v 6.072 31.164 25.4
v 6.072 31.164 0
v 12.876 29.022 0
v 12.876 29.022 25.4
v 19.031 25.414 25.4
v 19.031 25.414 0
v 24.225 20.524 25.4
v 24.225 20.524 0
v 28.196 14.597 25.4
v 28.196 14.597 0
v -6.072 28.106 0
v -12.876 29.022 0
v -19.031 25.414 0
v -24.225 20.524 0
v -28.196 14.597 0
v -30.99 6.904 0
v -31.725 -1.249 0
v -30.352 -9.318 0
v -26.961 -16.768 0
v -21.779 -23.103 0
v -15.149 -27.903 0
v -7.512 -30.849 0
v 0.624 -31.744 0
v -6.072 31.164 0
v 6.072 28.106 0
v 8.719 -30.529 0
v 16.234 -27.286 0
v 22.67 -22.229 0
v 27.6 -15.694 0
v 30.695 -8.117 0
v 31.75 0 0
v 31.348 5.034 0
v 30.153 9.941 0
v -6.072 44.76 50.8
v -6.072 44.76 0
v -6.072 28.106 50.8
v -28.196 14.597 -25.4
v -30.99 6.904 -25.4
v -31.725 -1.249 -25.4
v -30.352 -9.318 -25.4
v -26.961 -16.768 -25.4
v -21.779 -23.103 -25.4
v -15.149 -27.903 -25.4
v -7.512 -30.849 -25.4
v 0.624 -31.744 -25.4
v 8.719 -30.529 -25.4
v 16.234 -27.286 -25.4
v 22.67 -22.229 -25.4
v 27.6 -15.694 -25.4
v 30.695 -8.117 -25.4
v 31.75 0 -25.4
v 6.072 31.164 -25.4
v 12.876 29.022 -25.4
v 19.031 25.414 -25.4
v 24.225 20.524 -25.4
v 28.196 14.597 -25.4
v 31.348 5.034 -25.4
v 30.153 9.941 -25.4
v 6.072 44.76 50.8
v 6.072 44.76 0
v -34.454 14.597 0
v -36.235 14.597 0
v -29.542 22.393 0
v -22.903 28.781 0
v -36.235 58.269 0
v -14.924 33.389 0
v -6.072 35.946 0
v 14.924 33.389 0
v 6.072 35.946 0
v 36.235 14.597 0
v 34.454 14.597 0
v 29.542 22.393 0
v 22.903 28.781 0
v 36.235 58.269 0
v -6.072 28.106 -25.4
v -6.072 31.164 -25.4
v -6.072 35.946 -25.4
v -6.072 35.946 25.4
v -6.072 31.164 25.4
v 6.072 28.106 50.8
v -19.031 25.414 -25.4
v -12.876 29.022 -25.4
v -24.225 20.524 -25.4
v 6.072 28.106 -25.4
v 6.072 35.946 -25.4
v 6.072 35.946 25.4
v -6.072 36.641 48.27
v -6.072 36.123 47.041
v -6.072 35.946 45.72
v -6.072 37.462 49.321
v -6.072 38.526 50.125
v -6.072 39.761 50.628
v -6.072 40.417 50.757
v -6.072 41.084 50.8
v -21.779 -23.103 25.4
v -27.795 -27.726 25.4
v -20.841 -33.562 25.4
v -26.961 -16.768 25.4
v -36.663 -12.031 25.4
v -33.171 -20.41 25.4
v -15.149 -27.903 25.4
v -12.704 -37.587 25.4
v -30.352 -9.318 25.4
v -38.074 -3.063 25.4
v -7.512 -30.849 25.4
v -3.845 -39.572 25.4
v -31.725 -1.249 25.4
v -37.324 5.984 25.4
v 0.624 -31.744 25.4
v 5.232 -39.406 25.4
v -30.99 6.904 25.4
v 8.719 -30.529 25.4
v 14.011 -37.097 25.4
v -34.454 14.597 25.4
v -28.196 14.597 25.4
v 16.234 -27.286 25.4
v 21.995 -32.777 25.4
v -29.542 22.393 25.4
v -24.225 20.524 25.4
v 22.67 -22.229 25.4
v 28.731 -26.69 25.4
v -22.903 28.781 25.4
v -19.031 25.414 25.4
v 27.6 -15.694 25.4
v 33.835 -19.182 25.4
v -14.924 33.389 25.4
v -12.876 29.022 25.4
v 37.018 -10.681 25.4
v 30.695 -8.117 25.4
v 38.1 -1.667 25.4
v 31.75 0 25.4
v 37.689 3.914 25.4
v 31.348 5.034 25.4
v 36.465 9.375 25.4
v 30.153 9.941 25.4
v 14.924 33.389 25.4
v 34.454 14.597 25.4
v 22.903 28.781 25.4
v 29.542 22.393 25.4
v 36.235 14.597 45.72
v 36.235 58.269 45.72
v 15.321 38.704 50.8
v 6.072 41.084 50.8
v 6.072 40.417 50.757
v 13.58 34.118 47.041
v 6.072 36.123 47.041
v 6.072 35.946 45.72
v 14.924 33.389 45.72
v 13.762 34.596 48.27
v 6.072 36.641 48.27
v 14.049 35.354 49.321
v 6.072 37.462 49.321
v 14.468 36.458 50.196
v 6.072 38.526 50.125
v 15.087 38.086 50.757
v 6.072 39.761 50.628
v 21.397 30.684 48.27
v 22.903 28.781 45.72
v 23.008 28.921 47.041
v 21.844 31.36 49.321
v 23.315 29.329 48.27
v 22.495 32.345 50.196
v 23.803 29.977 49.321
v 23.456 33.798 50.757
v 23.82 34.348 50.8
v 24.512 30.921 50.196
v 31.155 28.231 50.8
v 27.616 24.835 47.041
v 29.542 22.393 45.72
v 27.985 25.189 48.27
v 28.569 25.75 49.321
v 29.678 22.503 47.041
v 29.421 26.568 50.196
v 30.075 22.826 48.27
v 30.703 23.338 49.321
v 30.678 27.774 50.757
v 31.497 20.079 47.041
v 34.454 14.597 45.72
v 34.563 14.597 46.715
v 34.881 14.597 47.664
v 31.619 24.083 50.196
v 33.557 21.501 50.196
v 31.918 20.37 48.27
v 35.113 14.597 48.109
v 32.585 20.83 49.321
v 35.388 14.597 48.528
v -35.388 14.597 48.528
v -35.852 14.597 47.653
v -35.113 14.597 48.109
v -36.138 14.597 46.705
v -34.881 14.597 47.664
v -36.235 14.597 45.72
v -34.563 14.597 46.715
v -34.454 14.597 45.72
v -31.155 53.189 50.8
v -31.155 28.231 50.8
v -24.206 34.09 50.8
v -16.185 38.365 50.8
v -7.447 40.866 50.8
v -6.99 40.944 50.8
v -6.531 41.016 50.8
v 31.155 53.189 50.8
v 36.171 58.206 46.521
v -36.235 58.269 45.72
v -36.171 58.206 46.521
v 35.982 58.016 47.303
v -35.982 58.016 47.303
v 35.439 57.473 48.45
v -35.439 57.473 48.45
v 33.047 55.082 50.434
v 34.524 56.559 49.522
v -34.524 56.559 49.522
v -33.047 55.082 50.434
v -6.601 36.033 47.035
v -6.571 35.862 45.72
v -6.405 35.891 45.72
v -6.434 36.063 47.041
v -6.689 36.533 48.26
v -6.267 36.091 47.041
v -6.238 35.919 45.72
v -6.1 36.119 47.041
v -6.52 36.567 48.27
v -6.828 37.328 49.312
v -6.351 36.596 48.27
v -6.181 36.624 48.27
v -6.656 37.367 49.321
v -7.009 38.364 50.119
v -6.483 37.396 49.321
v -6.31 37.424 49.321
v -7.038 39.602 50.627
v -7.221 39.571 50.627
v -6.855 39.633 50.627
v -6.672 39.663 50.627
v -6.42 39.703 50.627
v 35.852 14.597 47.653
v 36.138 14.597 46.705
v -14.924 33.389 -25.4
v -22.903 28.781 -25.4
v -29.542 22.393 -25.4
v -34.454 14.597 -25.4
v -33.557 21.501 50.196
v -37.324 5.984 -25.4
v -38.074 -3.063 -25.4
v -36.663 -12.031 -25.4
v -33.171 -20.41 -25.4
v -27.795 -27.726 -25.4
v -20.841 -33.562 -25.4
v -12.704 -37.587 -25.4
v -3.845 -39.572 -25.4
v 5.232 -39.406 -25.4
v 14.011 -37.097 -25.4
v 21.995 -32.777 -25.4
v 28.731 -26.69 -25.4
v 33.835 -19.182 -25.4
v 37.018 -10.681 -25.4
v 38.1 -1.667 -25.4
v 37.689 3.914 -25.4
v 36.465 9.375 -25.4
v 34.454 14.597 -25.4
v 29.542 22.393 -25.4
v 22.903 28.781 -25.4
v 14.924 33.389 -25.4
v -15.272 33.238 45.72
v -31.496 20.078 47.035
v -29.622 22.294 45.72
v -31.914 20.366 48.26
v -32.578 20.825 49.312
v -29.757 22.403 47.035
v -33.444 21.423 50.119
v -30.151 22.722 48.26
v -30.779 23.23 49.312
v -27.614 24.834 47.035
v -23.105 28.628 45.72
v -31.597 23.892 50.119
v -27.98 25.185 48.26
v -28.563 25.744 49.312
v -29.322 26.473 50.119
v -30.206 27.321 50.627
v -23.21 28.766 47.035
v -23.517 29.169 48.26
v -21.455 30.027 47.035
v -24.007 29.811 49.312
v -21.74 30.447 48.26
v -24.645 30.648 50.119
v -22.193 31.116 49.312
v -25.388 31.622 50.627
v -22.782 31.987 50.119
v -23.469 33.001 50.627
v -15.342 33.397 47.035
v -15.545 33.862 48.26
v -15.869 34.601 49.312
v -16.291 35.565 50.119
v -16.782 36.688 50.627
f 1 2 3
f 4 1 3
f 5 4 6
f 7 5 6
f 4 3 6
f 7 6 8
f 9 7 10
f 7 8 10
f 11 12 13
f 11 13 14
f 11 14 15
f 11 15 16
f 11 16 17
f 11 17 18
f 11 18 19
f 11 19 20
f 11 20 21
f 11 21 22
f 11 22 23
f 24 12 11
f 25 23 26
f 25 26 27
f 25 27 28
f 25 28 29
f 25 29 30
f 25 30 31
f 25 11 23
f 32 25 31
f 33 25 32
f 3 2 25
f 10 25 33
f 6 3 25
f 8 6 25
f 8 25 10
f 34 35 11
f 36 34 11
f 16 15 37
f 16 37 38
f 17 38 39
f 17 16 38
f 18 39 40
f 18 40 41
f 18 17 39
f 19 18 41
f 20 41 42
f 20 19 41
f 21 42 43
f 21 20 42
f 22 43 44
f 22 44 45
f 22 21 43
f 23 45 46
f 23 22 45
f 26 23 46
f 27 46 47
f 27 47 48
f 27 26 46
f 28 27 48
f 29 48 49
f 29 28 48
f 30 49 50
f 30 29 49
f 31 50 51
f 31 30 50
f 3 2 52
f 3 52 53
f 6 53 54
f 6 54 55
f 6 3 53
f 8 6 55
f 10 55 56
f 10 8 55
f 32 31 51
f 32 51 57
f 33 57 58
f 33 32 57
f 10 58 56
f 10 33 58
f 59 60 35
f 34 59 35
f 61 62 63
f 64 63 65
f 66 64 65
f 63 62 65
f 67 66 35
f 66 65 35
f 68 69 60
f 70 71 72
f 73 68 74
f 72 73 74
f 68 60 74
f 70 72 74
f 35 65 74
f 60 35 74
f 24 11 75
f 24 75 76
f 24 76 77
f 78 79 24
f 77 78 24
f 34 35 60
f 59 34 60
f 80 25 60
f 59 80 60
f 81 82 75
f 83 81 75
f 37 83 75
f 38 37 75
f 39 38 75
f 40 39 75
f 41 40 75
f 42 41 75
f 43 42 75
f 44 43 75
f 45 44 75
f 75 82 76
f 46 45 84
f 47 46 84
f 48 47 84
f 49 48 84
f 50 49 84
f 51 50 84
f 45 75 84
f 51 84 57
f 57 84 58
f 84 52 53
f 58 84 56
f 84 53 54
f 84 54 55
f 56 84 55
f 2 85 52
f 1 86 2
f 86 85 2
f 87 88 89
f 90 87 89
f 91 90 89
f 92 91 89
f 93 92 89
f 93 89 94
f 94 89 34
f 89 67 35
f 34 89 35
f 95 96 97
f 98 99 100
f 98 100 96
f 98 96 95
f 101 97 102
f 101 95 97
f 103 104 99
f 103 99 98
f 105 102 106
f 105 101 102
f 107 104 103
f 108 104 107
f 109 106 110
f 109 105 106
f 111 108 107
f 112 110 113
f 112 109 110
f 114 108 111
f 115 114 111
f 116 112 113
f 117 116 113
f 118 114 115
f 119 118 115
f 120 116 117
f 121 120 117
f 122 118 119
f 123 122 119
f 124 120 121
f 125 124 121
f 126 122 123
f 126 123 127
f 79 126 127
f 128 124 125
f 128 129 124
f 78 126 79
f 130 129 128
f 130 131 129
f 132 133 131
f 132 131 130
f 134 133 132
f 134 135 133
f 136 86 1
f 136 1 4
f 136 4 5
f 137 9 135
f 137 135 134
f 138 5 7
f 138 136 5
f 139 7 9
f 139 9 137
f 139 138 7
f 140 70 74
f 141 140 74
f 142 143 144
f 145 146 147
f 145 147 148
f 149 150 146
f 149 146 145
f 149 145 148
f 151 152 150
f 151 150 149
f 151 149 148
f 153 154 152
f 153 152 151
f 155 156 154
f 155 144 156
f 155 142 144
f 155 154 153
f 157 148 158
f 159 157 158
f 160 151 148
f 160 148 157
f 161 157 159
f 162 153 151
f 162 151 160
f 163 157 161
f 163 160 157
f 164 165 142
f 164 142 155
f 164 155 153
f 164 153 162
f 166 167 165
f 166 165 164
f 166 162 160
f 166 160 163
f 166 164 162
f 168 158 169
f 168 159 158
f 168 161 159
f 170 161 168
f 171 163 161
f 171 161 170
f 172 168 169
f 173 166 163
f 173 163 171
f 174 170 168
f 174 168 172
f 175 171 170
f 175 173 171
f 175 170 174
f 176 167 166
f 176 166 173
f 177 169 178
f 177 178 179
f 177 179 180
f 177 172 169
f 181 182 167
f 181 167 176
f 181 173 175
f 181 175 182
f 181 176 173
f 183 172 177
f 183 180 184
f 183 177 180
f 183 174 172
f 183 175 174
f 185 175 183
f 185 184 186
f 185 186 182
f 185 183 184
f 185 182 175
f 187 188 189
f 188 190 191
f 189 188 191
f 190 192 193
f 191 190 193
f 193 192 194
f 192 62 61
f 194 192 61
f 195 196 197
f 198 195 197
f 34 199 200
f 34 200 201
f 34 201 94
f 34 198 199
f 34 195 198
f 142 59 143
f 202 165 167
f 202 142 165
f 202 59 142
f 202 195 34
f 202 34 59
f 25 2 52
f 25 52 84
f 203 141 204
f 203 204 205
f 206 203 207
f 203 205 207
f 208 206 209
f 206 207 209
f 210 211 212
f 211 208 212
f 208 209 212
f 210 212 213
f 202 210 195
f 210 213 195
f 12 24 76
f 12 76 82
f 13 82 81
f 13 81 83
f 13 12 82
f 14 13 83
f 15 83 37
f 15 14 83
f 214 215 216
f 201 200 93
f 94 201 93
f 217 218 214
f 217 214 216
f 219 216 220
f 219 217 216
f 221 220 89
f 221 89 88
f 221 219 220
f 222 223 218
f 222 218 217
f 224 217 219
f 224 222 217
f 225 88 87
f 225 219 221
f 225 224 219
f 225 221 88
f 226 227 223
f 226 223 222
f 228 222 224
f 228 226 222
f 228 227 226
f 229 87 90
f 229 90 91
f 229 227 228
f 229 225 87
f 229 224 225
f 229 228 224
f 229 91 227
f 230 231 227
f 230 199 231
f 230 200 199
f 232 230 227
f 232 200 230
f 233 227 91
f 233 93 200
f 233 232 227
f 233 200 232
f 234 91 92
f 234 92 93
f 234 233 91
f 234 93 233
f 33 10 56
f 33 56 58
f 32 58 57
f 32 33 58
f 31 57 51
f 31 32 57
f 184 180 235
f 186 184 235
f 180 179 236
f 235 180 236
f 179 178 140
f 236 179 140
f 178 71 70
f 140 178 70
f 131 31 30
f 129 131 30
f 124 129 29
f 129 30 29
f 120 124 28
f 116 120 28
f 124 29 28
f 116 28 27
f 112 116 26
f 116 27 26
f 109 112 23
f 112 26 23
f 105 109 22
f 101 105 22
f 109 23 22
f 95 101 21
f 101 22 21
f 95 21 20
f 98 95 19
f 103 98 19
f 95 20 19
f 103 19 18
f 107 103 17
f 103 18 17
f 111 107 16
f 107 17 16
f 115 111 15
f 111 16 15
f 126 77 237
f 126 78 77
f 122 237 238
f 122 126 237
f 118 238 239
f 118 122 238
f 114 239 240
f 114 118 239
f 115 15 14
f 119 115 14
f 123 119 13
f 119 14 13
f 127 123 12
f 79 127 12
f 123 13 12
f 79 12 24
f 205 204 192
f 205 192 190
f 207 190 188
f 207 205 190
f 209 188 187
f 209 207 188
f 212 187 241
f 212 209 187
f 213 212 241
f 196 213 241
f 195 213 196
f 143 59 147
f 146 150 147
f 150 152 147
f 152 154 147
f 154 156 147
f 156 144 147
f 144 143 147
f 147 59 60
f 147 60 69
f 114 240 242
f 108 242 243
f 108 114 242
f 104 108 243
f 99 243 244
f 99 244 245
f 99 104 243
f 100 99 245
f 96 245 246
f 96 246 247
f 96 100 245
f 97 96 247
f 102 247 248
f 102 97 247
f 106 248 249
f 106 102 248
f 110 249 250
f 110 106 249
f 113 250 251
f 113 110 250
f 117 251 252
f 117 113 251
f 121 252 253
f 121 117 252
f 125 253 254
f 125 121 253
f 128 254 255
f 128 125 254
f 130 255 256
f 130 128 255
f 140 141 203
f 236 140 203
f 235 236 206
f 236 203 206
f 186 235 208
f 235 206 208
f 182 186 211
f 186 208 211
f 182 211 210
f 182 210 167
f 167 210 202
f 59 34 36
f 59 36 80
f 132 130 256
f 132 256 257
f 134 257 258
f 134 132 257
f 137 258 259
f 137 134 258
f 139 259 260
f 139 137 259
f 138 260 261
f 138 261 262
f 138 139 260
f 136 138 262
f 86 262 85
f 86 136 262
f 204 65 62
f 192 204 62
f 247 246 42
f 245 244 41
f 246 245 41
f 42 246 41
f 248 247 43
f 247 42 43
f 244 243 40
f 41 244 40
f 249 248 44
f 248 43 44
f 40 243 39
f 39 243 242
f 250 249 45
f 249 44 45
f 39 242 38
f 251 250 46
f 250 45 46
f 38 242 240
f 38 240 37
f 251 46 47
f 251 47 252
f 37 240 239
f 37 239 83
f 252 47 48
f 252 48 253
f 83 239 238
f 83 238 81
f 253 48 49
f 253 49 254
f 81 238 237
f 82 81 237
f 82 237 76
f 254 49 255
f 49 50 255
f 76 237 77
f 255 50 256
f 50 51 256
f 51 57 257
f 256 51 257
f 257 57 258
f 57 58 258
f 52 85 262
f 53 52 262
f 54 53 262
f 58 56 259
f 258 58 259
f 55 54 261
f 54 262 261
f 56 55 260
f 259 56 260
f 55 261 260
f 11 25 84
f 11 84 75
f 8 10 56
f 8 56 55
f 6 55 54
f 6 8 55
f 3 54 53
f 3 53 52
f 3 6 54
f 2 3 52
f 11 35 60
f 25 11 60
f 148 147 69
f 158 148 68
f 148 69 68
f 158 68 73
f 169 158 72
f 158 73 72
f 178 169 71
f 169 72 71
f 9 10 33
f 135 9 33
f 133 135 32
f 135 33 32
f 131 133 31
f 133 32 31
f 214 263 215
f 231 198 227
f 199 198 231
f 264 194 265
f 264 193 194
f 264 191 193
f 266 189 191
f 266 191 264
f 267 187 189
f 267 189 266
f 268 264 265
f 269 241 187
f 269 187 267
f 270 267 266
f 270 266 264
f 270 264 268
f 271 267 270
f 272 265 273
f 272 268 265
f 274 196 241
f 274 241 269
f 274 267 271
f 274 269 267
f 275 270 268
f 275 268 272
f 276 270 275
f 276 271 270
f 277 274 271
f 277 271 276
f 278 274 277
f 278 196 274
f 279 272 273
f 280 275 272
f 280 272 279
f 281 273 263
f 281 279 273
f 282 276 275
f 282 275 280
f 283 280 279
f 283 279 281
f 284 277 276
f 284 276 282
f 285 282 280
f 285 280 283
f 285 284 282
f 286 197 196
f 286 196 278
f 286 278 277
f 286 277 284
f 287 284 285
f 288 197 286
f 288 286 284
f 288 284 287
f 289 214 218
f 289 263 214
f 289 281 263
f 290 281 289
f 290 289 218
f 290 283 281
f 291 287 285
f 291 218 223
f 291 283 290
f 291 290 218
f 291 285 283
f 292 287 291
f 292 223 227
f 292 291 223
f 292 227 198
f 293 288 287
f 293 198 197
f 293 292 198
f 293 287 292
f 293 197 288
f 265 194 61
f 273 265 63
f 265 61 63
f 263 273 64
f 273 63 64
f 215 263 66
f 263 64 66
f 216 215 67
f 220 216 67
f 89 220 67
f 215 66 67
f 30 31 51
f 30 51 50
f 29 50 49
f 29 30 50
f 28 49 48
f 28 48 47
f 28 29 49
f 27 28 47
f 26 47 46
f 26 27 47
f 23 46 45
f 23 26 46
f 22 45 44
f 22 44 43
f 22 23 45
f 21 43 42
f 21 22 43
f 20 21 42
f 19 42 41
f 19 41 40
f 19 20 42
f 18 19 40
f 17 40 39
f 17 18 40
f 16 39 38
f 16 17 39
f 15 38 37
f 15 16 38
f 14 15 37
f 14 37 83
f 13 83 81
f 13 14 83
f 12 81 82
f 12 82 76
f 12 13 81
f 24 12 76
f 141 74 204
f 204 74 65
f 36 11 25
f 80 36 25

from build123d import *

# Parameters (mm, degrees)
F1_DEPTH    = 50.8
F2_DEPTH    = 25.4
F3_DEPTH    = 25.4
F4_T1_DEPTH = 97.86927917
F4_T3_DEPTH = 69.072270802
F4_T6_ANGLE = 93.763795783
F4_T8_ANGLE = 93.763795783
F5_DEPTH    = 50.8


# Not quite as in the source:
# - a fillet or chamfer that OpenCascade refuses, or shapes differently, is made with other operations: its cross-section is extruded or revolved along the edge and cut away or added


with BuildPart() as f1:
    # F0 (on Top) → F1 (new body)
    with BuildSketch(Plane.XY):
        with BuildLine():
            ThreePointArc((6.0717510059, 35.9461629091), (22.9027694367, 28.7809581965), (34.4542698124, 14.5969468084))
            Line((34.4542698124, 14.5969468084), (36.234639585, 14.5969468084))
            Line((36.234639585, 14.5969468084), (36.234639585, 58.2692176104))
            Line((36.234639585, 58.2692176104), (-36.234639585, 58.2692176104))
            Line((-36.234639585, 58.2692176104), (-36.234639585, 14.5969468084))
            Line((-36.234639585, 14.5969468084), (-34.4542698124, 14.5969468084))
            ThreePointArc((-34.4542698124, 14.5969468084), (-22.9027694367, 28.7809581965), (-6.0717510059, 35.9461629091))
            Line((-6.0717510059, 35.9461629091), (-6.0717510059, 44.7598363188))
            Line((-6.0717510059, 44.7598363188), (6.0717510059, 44.7598363188))
            Line((6.0717510059, 44.7598363188), (6.0717510059, 35.9461629091))
        make_face()
    extrude(amount=F1_DEPTH)

    # F4: fillet of radius 5.08 on 5 edges, made by hand

    # F4_s2 → F4_t1 (cut)
    with BuildSketch(Plane.YZ.offset(-48.934639585)):
        with BuildLine():
            ThreePointArc((58.2692176104, 45.72), (56.7813200588, 49.3121024484), (53.1892176104, 50.8))
            Line((53.1892176104, 50.8), (58.2692176104, 50.8))
            Line((58.2692176104, 50.8), (58.2692176104, 45.72))
        make_face()
    extrude(amount=F4_T1_DEPTH, mode=Mode.SUBTRACT)

    # F4_s4 → F4_t3 (cut)
    with BuildSketch(Plane.XZ.offset(-70.9692176104)):
        with BuildLine():
            ThreePointArc((36.234639585, 45.72), (34.7467420334, 49.3121024484), (31.154639585, 50.8))
            Line((31.154639585, 50.8), (36.234639585, 50.8))
            Line((36.234639585, 50.8), (36.234639585, 45.72))
        make_face()
        with BuildLine():
            ThreePointArc((-36.234639585, 45.72), (-34.7467420334, 49.3121024484), (-31.154639585, 50.8))
            Line((-31.154639585, 50.8), (-36.234639585, 50.8))
            Line((-36.234639585, 50.8), (-36.234639585, 45.72))
        make_face()
    extrude(amount=F4_T3_DEPTH, mode=Mode.SUBTRACT)

    # F4_s5 → F4_t6 (revolve, cut)
    with BuildSketch(Plane(origin=(-0.2831878776, -0.0495849538, 0), x_dir=(0, 0, 1), z_dir=(-0.9850144718, -0.1724717085, 0))):
        with BuildLine():
            ThreePointArc((45.72, 36.4580618529), (49.3121024484, 37.9459594044), (50.8, 41.5380618529))
            Line((50.8, 41.5380618529), (50.8, 36.4580618529))
            Line((50.8, 36.4580618529), (45.72, 36.4580618529))
        make_face()
    revolve(axis=Axis((0, -1.6669177906, 50.8), (0, 0, -1)), revolution_arc=F4_T6_ANGLE, mode=Mode.SUBTRACT)

    # F4_s7 → F4_t8 (revolve, cut)
    with BuildSketch(Plane(origin=(-0.1780570086, -1.6476759621, 0), x_dir=(0, 0, 1), z_dir=(-0.1074400196, -0.9942115681, 0))):
        with BuildLine():
            ThreePointArc((45.72, 37.9209063199), (49.3121024484, 39.4088038715), (50.8, 43.0009063199))
            Line((50.8, 43.0009063199), (50.8, 37.9209063199))
            Line((50.8, 37.9209063199), (45.72, 37.9209063199))
        make_face()
    revolve(axis=Axis((0, -1.6669177906, 50.8), (0, 0, -1)), revolution_arc=F4_T8_ANGLE, mode=Mode.SUBTRACT)


with BuildPart() as f2:
    # F0 (on Top) → F2 (new body, symmetric)
    with BuildSketch(Plane.XY):
        with BuildLine():
            ThreePointArc((-34.4542698124, 14.5969468084), (-8.3337362614, -38.8443146861), (38.1, -1.6669177906))
            ThreePointArc((38.1, -1.6669177906), (37.1773968955, 6.6668184707), (34.4542698124, 14.5969468084))
            Line((34.4542698124, 14.5969468084), (28.1955961787, 14.5969468084))
            ThreePointArc((28.1955961787, 14.5969468084), (30.8486035233, 7.5117348637), (31.75, 0))
            ThreePointArc((31.75, 0), (-7.5117348637, -30.8486035233), (-28.1955961787, 14.5969468084))
            Line((-28.1955961787, 14.5969468084), (-34.4542698124, 14.5969468084))
        make_face()
        with BuildLine():
            Line((28.1955961787, 14.5969468084), (34.4542698124, 14.5969468084))
            ThreePointArc((34.4542698124, 14.5969468084), (22.9027694367, 28.7809581965), (6.0717510059, 35.9461629091))
            Line((6.0717510059, 35.9461629091), (6.0717510059, 31.1640231633))
            ThreePointArc((6.0717510059, 31.1640231633), (19.0310213994, 25.414222878), (28.1955961787, 14.5969468084))
        make_face()
        with BuildLine():
            ThreePointArc((-6.0717510059, 35.9461629091), (-22.9027694367, 28.7809581965), (-34.4542698124, 14.5969468084))
            Line((-34.4542698124, 14.5969468084), (-28.1955961787, 14.5969468084))
            ThreePointArc((-28.1955961787, 14.5969468084), (-19.0310213994, 25.414222878), (-6.0717510059, 31.1640231633))
            Line((-6.0717510059, 31.1640231633), (-6.0717510059, 35.9461629091))
        make_face()
    extrude(amount=F2_DEPTH, both=True)


with BuildPart() as f3:
    # F0 (on Top) → F3 (new body)
    with BuildSketch(Plane.XY):
        with BuildLine():
            ThreePointArc((31.75, 0), (30.8486035233, 7.5117348637), (28.1955961787, 14.5969468084))
            Line((28.1955961787, 14.5969468084), (-28.1955961787, 14.5969468084))
            ThreePointArc((-28.1955961787, 14.5969468084), (-7.5117348637, -30.8486035233), (31.75, 0))
        make_face()
        with BuildLine():
            Line((-28.1955961787, 14.5969468084), (28.1955961787, 14.5969468084))
            ThreePointArc((28.1955961787, 14.5969468084), (19.0310213994, 25.414222878), (6.0717510059, 31.1640231633))
            Line((6.0717510059, 31.1640231633), (6.0717510059, 28.1063281))
            Line((6.0717510059, 28.1063281), (-6.0717510059, 28.1063281))
            Line((-6.0717510059, 28.1063281), (-6.0717510059, 31.1640231633))
            ThreePointArc((-6.0717510059, 31.1640231633), (-19.0310213994, 25.414222878), (-28.1955961787, 14.5969468084))
        make_face()
    extrude(amount=-F3_DEPTH)


with BuildPart() as f5:
    # F0 (on Top) → F5 (new body)
    with BuildSketch(Plane.XY):
        with BuildLine():
            Line((6.0717510059, 31.1640231633), (6.0717510059, 35.9461629091))
            ThreePointArc((6.0717510059, 35.9461629091), (0, 36.4330822094), (-6.0717510059, 35.9461629091))
            Line((-6.0717510059, 35.9461629091), (-6.0717510059, 31.1640231633))
            ThreePointArc((-6.0717510059, 31.1640231633), (0, 31.75), (6.0717510059, 31.1640231633))
        make_face()
        with BuildLine():
            ThreePointArc((-6.0717510059, 35.9461629091), (0, 36.4330822094), (6.0717510059, 35.9461629091))
            Line((6.0717510059, 35.9461629091), (6.0717510059, 44.7598363188))
            Line((6.0717510059, 44.7598363188), (-6.0717510059, 44.7598363188))
            Line((-6.0717510059, 44.7598363188), (-6.0717510059, 35.9461629091))
        make_face()
        with BuildLine():
            Line((6.0717510059, 28.1063281), (6.0717510059, 31.1640231633))
            ThreePointArc((6.0717510059, 31.1640231633), (0, 31.75), (-6.0717510059, 31.1640231633))
            Line((-6.0717510059, 31.1640231633), (-6.0717510059, 28.1063281))
            Line((-6.0717510059, 28.1063281), (6.0717510059, 28.1063281))
        make_face()
    extrude(amount=F5_DEPTH)


solid = Compound([f1.part, f2.part, f3.part, f5.part])
